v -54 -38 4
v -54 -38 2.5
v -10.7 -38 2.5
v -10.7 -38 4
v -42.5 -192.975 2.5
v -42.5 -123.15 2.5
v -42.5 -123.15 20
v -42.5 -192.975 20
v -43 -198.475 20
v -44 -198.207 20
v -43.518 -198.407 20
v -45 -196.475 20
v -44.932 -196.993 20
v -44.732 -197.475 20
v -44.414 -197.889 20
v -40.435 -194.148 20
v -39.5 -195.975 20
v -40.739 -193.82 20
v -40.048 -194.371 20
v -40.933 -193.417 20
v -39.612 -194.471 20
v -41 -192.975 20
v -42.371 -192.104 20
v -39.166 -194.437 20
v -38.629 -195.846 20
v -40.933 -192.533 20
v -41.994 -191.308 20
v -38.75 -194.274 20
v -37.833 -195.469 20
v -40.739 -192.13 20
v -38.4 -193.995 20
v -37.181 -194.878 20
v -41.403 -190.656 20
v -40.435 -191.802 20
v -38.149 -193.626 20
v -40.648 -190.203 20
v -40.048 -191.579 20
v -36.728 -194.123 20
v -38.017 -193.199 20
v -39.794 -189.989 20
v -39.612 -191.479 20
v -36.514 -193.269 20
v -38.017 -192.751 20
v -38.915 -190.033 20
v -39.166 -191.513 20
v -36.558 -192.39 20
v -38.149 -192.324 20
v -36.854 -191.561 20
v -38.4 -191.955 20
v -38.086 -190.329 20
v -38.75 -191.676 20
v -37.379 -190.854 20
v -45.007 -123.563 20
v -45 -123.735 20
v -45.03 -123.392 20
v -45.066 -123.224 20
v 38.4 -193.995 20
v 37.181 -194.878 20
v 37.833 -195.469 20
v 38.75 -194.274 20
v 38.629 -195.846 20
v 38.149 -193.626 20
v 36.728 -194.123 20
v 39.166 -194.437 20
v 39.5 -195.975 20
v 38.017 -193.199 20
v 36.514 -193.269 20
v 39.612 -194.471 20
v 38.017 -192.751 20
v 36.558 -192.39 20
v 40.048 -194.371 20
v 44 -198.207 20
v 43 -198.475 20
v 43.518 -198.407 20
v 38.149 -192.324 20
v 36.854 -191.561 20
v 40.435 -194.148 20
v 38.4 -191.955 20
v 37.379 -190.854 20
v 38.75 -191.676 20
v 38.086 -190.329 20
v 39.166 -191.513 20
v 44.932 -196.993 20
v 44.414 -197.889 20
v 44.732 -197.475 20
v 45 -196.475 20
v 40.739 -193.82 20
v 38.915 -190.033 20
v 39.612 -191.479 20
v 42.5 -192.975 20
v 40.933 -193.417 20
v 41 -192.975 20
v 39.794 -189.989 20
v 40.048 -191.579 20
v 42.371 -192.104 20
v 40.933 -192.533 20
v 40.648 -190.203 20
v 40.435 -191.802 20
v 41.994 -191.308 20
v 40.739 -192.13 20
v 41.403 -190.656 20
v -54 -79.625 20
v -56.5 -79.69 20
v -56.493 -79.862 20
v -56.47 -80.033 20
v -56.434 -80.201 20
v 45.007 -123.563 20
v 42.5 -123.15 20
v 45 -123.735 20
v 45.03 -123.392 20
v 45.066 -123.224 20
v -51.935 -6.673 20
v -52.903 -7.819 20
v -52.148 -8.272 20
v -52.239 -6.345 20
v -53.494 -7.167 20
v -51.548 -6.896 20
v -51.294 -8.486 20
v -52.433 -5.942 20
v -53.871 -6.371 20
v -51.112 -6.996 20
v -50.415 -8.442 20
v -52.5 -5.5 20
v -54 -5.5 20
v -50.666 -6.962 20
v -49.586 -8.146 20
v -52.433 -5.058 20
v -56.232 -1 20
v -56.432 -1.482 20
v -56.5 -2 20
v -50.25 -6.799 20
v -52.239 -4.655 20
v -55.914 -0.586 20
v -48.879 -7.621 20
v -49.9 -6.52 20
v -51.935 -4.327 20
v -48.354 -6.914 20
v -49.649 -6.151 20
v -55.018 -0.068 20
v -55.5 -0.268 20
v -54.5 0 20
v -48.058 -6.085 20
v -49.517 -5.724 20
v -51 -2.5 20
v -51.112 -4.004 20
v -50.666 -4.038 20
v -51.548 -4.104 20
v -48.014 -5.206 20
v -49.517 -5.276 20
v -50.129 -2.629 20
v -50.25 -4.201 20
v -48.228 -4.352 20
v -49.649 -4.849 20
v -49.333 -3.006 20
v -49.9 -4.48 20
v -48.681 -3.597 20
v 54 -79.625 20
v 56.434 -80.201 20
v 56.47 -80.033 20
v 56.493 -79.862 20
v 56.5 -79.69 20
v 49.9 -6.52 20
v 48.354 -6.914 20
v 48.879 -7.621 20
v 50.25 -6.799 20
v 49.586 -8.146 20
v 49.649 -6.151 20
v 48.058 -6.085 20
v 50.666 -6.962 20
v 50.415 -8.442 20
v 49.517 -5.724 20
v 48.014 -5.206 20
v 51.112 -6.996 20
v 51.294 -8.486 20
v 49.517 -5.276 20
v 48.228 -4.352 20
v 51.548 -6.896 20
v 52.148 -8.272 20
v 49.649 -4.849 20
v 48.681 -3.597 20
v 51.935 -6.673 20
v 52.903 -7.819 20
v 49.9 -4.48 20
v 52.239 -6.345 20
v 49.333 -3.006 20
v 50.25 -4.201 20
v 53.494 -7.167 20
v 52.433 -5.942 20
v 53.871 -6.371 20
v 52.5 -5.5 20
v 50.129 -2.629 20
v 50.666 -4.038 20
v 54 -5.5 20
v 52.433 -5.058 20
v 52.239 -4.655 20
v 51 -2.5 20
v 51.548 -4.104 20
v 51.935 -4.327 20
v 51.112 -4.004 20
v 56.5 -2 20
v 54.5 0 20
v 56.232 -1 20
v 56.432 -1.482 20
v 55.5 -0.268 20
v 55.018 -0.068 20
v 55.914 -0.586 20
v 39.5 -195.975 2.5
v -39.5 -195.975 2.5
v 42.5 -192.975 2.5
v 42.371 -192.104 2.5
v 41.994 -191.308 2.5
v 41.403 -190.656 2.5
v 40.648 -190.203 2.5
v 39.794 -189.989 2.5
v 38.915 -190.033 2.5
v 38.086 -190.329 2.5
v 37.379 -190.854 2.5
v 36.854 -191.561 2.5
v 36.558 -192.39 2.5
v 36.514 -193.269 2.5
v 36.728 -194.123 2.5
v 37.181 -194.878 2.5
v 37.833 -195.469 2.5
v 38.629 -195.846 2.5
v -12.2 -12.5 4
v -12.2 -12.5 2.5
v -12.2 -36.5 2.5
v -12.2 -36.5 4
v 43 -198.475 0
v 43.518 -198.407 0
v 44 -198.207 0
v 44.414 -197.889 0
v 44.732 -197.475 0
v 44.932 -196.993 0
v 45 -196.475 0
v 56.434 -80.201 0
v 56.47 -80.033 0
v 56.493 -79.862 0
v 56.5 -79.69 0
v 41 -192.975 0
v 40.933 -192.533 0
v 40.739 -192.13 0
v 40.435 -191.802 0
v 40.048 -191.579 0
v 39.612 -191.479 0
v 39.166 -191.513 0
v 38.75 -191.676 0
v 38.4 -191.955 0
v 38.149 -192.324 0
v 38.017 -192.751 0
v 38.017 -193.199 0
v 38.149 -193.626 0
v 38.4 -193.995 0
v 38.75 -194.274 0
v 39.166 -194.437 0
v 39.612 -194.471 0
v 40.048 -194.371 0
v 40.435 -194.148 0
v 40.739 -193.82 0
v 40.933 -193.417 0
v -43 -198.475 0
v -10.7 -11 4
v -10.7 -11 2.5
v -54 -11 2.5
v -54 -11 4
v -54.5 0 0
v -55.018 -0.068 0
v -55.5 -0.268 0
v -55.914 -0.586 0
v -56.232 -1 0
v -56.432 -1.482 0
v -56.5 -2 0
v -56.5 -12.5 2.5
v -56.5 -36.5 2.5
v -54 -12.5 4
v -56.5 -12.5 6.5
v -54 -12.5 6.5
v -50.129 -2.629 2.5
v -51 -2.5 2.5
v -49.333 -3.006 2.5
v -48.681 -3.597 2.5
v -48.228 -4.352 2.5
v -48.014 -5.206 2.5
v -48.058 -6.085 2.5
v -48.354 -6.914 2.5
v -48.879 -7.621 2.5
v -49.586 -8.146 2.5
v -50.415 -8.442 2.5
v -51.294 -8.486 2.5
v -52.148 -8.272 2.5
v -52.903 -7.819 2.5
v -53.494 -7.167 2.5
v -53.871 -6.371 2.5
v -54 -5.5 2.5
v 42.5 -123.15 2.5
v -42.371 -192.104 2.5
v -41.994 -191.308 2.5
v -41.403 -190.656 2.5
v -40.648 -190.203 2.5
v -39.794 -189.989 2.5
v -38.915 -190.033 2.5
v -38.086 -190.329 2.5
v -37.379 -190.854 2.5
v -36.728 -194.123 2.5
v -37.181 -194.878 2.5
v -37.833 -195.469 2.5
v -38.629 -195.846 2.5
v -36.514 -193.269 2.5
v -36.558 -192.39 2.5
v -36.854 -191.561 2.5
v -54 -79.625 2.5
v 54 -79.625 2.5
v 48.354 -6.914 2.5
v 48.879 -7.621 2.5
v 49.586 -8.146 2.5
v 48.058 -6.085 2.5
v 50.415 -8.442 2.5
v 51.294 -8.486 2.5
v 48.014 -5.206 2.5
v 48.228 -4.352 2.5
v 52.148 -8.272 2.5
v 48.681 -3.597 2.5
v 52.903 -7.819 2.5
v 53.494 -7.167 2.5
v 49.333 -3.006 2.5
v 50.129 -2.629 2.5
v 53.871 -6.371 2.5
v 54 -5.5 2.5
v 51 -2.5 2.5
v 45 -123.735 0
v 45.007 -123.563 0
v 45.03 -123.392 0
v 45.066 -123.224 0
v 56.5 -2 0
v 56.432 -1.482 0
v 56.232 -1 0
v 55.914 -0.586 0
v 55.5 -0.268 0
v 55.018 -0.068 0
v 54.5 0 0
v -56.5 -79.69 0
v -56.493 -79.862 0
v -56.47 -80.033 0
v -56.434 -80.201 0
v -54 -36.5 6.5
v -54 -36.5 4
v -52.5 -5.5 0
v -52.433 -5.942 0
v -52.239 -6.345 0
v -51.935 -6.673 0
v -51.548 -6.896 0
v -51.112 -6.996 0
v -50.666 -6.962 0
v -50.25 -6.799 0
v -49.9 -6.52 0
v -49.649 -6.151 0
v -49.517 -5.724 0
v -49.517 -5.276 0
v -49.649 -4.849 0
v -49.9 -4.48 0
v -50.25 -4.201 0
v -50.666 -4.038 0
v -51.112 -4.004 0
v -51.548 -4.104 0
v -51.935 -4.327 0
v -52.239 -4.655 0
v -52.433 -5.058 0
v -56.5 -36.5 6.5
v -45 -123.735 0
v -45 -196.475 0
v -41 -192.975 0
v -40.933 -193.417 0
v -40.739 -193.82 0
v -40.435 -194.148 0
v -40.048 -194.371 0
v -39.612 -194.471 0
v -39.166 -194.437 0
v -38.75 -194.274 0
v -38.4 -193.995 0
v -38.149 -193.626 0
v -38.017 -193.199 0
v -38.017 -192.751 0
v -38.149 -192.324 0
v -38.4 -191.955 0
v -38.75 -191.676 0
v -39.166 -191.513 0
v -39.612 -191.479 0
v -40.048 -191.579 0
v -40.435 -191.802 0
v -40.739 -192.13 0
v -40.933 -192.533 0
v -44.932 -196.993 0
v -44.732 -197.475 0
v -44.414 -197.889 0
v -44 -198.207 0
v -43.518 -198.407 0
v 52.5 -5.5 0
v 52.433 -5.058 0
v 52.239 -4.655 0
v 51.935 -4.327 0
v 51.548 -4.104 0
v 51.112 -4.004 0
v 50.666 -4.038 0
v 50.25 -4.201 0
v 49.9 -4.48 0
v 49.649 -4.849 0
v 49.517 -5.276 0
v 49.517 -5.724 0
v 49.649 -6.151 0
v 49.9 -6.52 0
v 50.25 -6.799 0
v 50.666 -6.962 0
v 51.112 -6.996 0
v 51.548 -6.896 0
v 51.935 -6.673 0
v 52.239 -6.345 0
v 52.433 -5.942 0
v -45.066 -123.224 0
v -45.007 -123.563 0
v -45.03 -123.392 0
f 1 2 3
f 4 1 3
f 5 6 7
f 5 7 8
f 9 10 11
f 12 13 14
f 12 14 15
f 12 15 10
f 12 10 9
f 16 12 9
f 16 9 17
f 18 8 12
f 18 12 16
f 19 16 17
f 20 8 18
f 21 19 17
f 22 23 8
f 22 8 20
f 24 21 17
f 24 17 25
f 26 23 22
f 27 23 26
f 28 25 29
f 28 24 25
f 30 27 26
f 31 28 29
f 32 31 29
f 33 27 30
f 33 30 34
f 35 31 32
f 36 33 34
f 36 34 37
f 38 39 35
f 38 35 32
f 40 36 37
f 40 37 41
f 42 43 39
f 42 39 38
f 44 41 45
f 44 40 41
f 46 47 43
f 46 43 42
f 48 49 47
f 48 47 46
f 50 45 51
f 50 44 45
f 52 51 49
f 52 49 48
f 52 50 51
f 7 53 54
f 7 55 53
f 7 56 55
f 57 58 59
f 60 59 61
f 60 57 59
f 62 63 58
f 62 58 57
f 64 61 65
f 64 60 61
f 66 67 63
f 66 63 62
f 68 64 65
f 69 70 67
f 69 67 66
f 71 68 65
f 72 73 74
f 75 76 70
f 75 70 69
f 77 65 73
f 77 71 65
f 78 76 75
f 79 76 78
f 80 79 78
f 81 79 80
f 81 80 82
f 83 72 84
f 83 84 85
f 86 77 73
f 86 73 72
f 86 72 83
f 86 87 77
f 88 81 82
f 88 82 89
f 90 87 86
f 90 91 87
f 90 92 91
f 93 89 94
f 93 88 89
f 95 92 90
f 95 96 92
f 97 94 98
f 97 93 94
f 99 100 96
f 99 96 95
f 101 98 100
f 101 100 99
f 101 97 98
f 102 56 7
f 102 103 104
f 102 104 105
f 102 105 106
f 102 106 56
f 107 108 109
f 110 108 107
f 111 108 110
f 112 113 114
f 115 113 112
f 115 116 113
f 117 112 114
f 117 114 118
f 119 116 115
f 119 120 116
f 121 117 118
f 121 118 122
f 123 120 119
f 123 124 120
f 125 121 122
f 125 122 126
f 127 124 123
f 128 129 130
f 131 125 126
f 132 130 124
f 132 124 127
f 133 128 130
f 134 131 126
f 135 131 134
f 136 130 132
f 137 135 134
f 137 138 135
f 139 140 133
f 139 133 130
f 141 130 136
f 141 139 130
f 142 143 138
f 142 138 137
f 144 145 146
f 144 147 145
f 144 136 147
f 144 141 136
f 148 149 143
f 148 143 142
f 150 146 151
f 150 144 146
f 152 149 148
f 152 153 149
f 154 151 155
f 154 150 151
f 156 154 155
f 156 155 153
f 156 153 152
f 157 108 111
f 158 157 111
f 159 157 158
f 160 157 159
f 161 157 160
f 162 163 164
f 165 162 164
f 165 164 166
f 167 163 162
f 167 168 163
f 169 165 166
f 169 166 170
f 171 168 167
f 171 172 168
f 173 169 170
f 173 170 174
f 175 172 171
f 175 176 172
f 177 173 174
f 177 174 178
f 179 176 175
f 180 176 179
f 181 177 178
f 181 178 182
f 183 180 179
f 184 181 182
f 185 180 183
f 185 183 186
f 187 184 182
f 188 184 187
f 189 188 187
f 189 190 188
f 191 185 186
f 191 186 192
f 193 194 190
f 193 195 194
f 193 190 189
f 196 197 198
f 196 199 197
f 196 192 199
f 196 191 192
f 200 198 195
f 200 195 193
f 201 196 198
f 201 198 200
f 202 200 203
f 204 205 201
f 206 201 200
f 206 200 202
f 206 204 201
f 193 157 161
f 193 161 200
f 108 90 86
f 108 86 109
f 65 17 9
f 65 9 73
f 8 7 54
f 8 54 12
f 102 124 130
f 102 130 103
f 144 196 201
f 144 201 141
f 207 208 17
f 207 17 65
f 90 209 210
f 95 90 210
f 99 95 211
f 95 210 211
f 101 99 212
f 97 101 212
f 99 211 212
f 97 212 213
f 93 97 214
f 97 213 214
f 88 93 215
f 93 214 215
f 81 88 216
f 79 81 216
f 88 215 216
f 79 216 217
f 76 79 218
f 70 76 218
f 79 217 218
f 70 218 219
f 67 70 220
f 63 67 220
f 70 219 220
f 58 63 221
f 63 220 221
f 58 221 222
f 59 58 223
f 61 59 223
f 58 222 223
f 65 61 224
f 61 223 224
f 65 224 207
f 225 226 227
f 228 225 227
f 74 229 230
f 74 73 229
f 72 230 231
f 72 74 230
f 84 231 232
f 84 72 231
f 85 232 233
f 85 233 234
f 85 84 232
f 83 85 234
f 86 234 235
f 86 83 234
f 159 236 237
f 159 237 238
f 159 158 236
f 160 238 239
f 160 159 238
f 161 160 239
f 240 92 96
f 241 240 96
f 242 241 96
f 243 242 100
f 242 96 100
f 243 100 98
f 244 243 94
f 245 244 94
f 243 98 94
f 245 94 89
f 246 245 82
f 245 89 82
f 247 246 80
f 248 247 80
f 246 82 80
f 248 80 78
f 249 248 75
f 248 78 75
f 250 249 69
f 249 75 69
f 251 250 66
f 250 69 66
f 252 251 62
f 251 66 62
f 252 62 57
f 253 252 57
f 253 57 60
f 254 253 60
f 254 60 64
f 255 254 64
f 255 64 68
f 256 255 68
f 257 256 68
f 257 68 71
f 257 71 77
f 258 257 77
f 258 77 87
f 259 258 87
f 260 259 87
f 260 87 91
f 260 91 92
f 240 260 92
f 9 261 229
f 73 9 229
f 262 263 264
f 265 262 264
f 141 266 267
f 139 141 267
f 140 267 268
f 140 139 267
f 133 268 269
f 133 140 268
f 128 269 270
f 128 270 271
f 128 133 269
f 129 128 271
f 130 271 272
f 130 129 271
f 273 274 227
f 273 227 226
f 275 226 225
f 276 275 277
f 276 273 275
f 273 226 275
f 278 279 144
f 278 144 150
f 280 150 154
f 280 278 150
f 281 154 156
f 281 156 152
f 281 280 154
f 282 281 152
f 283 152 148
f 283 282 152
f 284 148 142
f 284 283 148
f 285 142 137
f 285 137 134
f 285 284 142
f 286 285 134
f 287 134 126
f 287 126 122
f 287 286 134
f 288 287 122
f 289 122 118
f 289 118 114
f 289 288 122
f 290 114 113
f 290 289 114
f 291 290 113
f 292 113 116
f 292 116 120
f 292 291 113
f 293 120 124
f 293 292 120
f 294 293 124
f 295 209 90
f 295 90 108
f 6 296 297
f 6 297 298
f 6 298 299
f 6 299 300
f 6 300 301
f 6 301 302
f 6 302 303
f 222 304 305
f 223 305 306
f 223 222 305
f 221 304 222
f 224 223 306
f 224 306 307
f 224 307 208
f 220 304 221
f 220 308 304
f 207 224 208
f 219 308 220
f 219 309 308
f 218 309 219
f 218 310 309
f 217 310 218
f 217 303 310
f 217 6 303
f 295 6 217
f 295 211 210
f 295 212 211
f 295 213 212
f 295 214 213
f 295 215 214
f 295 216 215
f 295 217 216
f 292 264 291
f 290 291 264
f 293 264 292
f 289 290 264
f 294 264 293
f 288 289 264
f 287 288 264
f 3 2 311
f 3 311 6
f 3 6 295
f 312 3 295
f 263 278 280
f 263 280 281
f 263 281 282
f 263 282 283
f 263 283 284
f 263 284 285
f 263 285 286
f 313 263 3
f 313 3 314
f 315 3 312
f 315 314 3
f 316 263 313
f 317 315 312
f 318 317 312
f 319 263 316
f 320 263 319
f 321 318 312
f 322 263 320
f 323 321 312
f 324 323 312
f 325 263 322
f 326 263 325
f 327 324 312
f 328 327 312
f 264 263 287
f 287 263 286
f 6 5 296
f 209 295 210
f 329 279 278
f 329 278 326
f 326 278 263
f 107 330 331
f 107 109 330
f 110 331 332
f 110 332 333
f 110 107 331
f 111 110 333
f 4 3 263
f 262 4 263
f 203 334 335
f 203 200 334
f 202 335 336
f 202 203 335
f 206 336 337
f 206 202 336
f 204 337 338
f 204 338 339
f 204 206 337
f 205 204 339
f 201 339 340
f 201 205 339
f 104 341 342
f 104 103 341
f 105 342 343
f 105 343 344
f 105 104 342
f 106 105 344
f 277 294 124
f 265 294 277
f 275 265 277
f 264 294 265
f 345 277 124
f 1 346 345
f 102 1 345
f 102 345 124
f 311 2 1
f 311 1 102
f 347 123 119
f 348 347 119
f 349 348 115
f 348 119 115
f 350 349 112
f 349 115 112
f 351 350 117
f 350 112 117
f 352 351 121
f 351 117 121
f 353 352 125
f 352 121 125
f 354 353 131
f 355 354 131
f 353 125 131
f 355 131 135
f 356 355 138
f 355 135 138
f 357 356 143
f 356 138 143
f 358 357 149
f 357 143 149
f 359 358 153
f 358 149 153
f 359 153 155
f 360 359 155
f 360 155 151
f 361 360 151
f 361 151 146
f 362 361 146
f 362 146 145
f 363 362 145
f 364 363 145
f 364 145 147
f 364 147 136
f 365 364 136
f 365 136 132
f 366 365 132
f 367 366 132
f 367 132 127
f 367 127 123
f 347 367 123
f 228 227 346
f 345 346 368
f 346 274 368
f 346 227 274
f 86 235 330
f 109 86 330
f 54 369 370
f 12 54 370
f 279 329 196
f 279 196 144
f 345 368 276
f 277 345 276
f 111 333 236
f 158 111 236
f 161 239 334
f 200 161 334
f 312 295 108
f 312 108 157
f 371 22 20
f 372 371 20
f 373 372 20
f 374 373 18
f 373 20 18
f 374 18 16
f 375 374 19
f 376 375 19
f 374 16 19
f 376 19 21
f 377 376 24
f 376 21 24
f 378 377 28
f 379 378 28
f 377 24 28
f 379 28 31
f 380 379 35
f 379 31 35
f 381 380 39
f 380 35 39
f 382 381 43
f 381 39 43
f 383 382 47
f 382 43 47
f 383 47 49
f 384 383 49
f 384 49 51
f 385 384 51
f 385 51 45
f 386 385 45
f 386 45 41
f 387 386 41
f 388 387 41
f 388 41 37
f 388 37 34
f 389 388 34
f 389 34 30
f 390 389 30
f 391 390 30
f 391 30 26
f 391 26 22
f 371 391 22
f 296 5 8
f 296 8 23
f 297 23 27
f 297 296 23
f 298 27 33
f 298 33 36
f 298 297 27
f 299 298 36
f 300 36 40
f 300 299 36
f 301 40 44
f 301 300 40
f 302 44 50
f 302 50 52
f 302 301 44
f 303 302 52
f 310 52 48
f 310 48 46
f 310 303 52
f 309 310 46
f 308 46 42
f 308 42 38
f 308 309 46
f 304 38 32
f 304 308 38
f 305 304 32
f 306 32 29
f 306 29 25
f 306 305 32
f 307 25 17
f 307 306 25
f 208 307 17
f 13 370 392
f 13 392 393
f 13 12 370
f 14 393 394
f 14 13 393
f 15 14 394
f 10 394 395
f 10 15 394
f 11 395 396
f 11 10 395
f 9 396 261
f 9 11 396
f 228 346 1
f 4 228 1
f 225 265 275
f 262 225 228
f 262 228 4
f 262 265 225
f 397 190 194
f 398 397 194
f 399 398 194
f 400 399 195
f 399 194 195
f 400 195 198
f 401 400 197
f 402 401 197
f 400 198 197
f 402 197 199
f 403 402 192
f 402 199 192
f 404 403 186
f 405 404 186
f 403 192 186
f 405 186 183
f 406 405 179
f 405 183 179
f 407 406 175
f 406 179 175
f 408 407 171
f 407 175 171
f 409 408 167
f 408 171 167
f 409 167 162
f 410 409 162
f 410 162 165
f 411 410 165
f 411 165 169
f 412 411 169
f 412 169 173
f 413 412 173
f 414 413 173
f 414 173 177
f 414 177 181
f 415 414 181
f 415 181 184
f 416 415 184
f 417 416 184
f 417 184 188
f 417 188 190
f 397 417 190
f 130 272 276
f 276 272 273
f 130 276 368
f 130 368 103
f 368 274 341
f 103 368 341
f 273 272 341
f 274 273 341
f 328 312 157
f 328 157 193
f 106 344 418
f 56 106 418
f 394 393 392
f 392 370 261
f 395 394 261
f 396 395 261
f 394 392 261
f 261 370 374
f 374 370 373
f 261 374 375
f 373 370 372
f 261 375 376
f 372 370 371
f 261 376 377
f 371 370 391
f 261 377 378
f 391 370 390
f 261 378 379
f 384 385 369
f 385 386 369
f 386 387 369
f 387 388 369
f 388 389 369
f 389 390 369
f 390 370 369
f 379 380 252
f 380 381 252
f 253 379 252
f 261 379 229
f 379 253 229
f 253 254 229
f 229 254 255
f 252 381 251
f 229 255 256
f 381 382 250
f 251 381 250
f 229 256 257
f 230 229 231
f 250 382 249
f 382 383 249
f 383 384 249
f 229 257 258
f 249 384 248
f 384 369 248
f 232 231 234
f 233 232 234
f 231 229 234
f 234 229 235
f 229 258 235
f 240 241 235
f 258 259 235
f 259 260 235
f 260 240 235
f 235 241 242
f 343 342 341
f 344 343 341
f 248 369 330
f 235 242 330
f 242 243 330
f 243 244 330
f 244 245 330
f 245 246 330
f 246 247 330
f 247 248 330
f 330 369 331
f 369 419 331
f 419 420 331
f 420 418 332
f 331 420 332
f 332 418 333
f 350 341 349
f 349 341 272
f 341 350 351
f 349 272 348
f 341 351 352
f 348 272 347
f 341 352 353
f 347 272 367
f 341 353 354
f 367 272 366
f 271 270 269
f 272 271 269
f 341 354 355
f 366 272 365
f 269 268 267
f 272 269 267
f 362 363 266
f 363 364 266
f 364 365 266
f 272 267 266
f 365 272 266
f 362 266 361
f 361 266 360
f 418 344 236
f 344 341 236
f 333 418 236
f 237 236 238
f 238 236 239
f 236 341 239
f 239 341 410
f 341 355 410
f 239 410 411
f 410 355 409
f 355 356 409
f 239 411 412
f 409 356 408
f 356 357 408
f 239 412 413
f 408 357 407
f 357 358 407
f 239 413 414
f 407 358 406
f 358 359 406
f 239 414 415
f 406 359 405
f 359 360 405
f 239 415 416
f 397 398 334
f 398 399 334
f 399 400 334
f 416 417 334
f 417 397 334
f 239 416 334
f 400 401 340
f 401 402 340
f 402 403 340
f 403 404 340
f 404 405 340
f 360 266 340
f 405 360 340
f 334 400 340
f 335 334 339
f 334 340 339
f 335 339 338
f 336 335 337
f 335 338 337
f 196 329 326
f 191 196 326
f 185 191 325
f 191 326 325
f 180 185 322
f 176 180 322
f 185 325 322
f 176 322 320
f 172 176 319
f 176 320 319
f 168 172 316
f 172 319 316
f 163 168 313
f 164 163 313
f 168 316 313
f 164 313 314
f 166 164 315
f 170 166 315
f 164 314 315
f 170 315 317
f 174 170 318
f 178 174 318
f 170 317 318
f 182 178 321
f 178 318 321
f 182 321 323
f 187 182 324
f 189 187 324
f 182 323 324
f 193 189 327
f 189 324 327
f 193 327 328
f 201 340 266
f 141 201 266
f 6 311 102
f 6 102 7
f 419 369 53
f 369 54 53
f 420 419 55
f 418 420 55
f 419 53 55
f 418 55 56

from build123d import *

# Parameters (mm, degrees)
BOSS_EXTRUDE1_DEPTH = 20
SHELL1_T            = -2.5
FILLET1_R           = 2
BOSS_EXTRUDE2_DEPTH = 17.5
SKETCH4_R           = 1.5
CUT_EXTRUDE1_DEPTH  = 208.327218727
BOSS_EXTRUDE3_DEPTH = 1.5
CUT_EXTRUDE2_REACH  = 231.263
SKETCH6_W           = 4
SKETCH6_H           = 24


with BuildPart() as part:
    # Sketch1 → Boss-Extrude1 (new body)
    with BuildSketch(Plane.XY):
        Polygon((-45, -123.475), (-45, -198.475), (45, -198.475), (45, -123.475), (56.5, -79.95), (56.5, 0), (-56.5, 0), (-56.5, -79.95), align=None)
    extrude(amount=BOSS_EXTRUDE1_DEPTH)

    # Shell1
    shell1_openings = [part.faces().sort_by_distance(p)[0] for p in [
        (0, -93.724865495, 20),
    ]]
    offset(amount=SHELL1_T, openings=shell1_openings, kind=Kind.INTERSECTION)

    # Fillet1
    fillet1_edges = [part.edges().sort_by_distance(p)[0] for p in [
        (-56.5, -79.95, 10),
        (-56.5, 0, 10),
        (56.5, 0, 10),
        (56.5, -79.95, 10),
        (45, -123.475, 10),
        (45, -198.475, 10),
        (-45, -198.475, 10),
        (-45, -123.475, 10),
    ]]
    fillet(fillet1_edges, radius=FILLET1_R)

    # Sketch2 → Boss-Extrude2 (add, through all)
    with BuildSketch(Plane.XY.offset(2.5)):
        with BuildLine():
            Line((54, -5.5), (54, -2.5))
            Line((54, -2.5), (51, -2.5))
            ThreePointArc((51, -2.5), (48.878679656, -7.621320344), (54, -5.5))
        make_face()
        with BuildLine():
            Line((42.5, -195.975), (42.5, -192.975))
            ThreePointArc((42.5, -192.975), (37.378679656, -190.853679656), (39.5, -195.975))
            Line((39.5, -195.975), (42.5, -195.975))
        make_face()
        with BuildLine():
            Line((-39.5, -195.975), (-42.5, -195.975))
            Line((-42.5, -195.975), (-42.5, -192.975))
            ThreePointArc((-42.5, -192.975), (-37.378679656, -190.853679656), (-39.5, -195.975))
        make_face()
        with BuildLine():
            Line((-54, -2.5), (-51, -2.5))
            ThreePointArc((-51, -2.5), (-48.878679656, -7.621320344), (-54, -5.5))
            Line((-54, -5.5), (-54, -2.5))
        make_face()
    extrude(amount=BOSS_EXTRUDE2_DEPTH)

    # Sketch4 → Cut-Extrude1 (cut, through all)
    with BuildSketch(Plane.XY.offset(20)):
        with Locations((51, -5.5)):
            Circle(SKETCH4_R)
        with Locations((39.5, -192.975)):
            Circle(SKETCH4_R)
        with Locations(Location((-39.5, -192.975, 0), (0, 0, 180))):
            Circle(SKETCH4_R)
        with Locations(Location((-51, -5.5, 0), (0, 0, 180))):
            Circle(SKETCH4_R)
    extrude(amount=-CUT_EXTRUDE1_DEPTH, mode=Mode.SUBTRACT)

    # Sketch5 → Boss-Extrude3 (add)
    with BuildSketch(Plane.XY.offset(2.5)):
        Polygon((-54, -11), (-54, -12.5), (-12.2, -12.5), (-12.2, -36.5), (-54, -36.5), (-54, -38), (-10.7, -38), (-10.7, -11), align=None)
    extrude(amount=BOSS_EXTRUDE3_DEPTH)

    # Sketch6 → Cut-Extrude2 (cut, up to next)
    with BuildSketch(Plane.ZY.offset(56.5), mode=Mode.PRIVATE) as cut_extrude2_sk1:
        with Locations((4.5, -24.5)):
            Rectangle(SKETCH6_W, SKETCH6_H)
    cut_extrude2_tool1 = extrude(cut_extrude2_sk1.sketch, amount=-CUT_EXTRUDE2_REACH, mode=Mode.PRIVATE) & part.part
    add(cut_extrude2_tool1.solids().sort_by_distance((-56.5, -24.5, 4.5))[0], mode=Mode.SUBTRACT)


solid = part.part
